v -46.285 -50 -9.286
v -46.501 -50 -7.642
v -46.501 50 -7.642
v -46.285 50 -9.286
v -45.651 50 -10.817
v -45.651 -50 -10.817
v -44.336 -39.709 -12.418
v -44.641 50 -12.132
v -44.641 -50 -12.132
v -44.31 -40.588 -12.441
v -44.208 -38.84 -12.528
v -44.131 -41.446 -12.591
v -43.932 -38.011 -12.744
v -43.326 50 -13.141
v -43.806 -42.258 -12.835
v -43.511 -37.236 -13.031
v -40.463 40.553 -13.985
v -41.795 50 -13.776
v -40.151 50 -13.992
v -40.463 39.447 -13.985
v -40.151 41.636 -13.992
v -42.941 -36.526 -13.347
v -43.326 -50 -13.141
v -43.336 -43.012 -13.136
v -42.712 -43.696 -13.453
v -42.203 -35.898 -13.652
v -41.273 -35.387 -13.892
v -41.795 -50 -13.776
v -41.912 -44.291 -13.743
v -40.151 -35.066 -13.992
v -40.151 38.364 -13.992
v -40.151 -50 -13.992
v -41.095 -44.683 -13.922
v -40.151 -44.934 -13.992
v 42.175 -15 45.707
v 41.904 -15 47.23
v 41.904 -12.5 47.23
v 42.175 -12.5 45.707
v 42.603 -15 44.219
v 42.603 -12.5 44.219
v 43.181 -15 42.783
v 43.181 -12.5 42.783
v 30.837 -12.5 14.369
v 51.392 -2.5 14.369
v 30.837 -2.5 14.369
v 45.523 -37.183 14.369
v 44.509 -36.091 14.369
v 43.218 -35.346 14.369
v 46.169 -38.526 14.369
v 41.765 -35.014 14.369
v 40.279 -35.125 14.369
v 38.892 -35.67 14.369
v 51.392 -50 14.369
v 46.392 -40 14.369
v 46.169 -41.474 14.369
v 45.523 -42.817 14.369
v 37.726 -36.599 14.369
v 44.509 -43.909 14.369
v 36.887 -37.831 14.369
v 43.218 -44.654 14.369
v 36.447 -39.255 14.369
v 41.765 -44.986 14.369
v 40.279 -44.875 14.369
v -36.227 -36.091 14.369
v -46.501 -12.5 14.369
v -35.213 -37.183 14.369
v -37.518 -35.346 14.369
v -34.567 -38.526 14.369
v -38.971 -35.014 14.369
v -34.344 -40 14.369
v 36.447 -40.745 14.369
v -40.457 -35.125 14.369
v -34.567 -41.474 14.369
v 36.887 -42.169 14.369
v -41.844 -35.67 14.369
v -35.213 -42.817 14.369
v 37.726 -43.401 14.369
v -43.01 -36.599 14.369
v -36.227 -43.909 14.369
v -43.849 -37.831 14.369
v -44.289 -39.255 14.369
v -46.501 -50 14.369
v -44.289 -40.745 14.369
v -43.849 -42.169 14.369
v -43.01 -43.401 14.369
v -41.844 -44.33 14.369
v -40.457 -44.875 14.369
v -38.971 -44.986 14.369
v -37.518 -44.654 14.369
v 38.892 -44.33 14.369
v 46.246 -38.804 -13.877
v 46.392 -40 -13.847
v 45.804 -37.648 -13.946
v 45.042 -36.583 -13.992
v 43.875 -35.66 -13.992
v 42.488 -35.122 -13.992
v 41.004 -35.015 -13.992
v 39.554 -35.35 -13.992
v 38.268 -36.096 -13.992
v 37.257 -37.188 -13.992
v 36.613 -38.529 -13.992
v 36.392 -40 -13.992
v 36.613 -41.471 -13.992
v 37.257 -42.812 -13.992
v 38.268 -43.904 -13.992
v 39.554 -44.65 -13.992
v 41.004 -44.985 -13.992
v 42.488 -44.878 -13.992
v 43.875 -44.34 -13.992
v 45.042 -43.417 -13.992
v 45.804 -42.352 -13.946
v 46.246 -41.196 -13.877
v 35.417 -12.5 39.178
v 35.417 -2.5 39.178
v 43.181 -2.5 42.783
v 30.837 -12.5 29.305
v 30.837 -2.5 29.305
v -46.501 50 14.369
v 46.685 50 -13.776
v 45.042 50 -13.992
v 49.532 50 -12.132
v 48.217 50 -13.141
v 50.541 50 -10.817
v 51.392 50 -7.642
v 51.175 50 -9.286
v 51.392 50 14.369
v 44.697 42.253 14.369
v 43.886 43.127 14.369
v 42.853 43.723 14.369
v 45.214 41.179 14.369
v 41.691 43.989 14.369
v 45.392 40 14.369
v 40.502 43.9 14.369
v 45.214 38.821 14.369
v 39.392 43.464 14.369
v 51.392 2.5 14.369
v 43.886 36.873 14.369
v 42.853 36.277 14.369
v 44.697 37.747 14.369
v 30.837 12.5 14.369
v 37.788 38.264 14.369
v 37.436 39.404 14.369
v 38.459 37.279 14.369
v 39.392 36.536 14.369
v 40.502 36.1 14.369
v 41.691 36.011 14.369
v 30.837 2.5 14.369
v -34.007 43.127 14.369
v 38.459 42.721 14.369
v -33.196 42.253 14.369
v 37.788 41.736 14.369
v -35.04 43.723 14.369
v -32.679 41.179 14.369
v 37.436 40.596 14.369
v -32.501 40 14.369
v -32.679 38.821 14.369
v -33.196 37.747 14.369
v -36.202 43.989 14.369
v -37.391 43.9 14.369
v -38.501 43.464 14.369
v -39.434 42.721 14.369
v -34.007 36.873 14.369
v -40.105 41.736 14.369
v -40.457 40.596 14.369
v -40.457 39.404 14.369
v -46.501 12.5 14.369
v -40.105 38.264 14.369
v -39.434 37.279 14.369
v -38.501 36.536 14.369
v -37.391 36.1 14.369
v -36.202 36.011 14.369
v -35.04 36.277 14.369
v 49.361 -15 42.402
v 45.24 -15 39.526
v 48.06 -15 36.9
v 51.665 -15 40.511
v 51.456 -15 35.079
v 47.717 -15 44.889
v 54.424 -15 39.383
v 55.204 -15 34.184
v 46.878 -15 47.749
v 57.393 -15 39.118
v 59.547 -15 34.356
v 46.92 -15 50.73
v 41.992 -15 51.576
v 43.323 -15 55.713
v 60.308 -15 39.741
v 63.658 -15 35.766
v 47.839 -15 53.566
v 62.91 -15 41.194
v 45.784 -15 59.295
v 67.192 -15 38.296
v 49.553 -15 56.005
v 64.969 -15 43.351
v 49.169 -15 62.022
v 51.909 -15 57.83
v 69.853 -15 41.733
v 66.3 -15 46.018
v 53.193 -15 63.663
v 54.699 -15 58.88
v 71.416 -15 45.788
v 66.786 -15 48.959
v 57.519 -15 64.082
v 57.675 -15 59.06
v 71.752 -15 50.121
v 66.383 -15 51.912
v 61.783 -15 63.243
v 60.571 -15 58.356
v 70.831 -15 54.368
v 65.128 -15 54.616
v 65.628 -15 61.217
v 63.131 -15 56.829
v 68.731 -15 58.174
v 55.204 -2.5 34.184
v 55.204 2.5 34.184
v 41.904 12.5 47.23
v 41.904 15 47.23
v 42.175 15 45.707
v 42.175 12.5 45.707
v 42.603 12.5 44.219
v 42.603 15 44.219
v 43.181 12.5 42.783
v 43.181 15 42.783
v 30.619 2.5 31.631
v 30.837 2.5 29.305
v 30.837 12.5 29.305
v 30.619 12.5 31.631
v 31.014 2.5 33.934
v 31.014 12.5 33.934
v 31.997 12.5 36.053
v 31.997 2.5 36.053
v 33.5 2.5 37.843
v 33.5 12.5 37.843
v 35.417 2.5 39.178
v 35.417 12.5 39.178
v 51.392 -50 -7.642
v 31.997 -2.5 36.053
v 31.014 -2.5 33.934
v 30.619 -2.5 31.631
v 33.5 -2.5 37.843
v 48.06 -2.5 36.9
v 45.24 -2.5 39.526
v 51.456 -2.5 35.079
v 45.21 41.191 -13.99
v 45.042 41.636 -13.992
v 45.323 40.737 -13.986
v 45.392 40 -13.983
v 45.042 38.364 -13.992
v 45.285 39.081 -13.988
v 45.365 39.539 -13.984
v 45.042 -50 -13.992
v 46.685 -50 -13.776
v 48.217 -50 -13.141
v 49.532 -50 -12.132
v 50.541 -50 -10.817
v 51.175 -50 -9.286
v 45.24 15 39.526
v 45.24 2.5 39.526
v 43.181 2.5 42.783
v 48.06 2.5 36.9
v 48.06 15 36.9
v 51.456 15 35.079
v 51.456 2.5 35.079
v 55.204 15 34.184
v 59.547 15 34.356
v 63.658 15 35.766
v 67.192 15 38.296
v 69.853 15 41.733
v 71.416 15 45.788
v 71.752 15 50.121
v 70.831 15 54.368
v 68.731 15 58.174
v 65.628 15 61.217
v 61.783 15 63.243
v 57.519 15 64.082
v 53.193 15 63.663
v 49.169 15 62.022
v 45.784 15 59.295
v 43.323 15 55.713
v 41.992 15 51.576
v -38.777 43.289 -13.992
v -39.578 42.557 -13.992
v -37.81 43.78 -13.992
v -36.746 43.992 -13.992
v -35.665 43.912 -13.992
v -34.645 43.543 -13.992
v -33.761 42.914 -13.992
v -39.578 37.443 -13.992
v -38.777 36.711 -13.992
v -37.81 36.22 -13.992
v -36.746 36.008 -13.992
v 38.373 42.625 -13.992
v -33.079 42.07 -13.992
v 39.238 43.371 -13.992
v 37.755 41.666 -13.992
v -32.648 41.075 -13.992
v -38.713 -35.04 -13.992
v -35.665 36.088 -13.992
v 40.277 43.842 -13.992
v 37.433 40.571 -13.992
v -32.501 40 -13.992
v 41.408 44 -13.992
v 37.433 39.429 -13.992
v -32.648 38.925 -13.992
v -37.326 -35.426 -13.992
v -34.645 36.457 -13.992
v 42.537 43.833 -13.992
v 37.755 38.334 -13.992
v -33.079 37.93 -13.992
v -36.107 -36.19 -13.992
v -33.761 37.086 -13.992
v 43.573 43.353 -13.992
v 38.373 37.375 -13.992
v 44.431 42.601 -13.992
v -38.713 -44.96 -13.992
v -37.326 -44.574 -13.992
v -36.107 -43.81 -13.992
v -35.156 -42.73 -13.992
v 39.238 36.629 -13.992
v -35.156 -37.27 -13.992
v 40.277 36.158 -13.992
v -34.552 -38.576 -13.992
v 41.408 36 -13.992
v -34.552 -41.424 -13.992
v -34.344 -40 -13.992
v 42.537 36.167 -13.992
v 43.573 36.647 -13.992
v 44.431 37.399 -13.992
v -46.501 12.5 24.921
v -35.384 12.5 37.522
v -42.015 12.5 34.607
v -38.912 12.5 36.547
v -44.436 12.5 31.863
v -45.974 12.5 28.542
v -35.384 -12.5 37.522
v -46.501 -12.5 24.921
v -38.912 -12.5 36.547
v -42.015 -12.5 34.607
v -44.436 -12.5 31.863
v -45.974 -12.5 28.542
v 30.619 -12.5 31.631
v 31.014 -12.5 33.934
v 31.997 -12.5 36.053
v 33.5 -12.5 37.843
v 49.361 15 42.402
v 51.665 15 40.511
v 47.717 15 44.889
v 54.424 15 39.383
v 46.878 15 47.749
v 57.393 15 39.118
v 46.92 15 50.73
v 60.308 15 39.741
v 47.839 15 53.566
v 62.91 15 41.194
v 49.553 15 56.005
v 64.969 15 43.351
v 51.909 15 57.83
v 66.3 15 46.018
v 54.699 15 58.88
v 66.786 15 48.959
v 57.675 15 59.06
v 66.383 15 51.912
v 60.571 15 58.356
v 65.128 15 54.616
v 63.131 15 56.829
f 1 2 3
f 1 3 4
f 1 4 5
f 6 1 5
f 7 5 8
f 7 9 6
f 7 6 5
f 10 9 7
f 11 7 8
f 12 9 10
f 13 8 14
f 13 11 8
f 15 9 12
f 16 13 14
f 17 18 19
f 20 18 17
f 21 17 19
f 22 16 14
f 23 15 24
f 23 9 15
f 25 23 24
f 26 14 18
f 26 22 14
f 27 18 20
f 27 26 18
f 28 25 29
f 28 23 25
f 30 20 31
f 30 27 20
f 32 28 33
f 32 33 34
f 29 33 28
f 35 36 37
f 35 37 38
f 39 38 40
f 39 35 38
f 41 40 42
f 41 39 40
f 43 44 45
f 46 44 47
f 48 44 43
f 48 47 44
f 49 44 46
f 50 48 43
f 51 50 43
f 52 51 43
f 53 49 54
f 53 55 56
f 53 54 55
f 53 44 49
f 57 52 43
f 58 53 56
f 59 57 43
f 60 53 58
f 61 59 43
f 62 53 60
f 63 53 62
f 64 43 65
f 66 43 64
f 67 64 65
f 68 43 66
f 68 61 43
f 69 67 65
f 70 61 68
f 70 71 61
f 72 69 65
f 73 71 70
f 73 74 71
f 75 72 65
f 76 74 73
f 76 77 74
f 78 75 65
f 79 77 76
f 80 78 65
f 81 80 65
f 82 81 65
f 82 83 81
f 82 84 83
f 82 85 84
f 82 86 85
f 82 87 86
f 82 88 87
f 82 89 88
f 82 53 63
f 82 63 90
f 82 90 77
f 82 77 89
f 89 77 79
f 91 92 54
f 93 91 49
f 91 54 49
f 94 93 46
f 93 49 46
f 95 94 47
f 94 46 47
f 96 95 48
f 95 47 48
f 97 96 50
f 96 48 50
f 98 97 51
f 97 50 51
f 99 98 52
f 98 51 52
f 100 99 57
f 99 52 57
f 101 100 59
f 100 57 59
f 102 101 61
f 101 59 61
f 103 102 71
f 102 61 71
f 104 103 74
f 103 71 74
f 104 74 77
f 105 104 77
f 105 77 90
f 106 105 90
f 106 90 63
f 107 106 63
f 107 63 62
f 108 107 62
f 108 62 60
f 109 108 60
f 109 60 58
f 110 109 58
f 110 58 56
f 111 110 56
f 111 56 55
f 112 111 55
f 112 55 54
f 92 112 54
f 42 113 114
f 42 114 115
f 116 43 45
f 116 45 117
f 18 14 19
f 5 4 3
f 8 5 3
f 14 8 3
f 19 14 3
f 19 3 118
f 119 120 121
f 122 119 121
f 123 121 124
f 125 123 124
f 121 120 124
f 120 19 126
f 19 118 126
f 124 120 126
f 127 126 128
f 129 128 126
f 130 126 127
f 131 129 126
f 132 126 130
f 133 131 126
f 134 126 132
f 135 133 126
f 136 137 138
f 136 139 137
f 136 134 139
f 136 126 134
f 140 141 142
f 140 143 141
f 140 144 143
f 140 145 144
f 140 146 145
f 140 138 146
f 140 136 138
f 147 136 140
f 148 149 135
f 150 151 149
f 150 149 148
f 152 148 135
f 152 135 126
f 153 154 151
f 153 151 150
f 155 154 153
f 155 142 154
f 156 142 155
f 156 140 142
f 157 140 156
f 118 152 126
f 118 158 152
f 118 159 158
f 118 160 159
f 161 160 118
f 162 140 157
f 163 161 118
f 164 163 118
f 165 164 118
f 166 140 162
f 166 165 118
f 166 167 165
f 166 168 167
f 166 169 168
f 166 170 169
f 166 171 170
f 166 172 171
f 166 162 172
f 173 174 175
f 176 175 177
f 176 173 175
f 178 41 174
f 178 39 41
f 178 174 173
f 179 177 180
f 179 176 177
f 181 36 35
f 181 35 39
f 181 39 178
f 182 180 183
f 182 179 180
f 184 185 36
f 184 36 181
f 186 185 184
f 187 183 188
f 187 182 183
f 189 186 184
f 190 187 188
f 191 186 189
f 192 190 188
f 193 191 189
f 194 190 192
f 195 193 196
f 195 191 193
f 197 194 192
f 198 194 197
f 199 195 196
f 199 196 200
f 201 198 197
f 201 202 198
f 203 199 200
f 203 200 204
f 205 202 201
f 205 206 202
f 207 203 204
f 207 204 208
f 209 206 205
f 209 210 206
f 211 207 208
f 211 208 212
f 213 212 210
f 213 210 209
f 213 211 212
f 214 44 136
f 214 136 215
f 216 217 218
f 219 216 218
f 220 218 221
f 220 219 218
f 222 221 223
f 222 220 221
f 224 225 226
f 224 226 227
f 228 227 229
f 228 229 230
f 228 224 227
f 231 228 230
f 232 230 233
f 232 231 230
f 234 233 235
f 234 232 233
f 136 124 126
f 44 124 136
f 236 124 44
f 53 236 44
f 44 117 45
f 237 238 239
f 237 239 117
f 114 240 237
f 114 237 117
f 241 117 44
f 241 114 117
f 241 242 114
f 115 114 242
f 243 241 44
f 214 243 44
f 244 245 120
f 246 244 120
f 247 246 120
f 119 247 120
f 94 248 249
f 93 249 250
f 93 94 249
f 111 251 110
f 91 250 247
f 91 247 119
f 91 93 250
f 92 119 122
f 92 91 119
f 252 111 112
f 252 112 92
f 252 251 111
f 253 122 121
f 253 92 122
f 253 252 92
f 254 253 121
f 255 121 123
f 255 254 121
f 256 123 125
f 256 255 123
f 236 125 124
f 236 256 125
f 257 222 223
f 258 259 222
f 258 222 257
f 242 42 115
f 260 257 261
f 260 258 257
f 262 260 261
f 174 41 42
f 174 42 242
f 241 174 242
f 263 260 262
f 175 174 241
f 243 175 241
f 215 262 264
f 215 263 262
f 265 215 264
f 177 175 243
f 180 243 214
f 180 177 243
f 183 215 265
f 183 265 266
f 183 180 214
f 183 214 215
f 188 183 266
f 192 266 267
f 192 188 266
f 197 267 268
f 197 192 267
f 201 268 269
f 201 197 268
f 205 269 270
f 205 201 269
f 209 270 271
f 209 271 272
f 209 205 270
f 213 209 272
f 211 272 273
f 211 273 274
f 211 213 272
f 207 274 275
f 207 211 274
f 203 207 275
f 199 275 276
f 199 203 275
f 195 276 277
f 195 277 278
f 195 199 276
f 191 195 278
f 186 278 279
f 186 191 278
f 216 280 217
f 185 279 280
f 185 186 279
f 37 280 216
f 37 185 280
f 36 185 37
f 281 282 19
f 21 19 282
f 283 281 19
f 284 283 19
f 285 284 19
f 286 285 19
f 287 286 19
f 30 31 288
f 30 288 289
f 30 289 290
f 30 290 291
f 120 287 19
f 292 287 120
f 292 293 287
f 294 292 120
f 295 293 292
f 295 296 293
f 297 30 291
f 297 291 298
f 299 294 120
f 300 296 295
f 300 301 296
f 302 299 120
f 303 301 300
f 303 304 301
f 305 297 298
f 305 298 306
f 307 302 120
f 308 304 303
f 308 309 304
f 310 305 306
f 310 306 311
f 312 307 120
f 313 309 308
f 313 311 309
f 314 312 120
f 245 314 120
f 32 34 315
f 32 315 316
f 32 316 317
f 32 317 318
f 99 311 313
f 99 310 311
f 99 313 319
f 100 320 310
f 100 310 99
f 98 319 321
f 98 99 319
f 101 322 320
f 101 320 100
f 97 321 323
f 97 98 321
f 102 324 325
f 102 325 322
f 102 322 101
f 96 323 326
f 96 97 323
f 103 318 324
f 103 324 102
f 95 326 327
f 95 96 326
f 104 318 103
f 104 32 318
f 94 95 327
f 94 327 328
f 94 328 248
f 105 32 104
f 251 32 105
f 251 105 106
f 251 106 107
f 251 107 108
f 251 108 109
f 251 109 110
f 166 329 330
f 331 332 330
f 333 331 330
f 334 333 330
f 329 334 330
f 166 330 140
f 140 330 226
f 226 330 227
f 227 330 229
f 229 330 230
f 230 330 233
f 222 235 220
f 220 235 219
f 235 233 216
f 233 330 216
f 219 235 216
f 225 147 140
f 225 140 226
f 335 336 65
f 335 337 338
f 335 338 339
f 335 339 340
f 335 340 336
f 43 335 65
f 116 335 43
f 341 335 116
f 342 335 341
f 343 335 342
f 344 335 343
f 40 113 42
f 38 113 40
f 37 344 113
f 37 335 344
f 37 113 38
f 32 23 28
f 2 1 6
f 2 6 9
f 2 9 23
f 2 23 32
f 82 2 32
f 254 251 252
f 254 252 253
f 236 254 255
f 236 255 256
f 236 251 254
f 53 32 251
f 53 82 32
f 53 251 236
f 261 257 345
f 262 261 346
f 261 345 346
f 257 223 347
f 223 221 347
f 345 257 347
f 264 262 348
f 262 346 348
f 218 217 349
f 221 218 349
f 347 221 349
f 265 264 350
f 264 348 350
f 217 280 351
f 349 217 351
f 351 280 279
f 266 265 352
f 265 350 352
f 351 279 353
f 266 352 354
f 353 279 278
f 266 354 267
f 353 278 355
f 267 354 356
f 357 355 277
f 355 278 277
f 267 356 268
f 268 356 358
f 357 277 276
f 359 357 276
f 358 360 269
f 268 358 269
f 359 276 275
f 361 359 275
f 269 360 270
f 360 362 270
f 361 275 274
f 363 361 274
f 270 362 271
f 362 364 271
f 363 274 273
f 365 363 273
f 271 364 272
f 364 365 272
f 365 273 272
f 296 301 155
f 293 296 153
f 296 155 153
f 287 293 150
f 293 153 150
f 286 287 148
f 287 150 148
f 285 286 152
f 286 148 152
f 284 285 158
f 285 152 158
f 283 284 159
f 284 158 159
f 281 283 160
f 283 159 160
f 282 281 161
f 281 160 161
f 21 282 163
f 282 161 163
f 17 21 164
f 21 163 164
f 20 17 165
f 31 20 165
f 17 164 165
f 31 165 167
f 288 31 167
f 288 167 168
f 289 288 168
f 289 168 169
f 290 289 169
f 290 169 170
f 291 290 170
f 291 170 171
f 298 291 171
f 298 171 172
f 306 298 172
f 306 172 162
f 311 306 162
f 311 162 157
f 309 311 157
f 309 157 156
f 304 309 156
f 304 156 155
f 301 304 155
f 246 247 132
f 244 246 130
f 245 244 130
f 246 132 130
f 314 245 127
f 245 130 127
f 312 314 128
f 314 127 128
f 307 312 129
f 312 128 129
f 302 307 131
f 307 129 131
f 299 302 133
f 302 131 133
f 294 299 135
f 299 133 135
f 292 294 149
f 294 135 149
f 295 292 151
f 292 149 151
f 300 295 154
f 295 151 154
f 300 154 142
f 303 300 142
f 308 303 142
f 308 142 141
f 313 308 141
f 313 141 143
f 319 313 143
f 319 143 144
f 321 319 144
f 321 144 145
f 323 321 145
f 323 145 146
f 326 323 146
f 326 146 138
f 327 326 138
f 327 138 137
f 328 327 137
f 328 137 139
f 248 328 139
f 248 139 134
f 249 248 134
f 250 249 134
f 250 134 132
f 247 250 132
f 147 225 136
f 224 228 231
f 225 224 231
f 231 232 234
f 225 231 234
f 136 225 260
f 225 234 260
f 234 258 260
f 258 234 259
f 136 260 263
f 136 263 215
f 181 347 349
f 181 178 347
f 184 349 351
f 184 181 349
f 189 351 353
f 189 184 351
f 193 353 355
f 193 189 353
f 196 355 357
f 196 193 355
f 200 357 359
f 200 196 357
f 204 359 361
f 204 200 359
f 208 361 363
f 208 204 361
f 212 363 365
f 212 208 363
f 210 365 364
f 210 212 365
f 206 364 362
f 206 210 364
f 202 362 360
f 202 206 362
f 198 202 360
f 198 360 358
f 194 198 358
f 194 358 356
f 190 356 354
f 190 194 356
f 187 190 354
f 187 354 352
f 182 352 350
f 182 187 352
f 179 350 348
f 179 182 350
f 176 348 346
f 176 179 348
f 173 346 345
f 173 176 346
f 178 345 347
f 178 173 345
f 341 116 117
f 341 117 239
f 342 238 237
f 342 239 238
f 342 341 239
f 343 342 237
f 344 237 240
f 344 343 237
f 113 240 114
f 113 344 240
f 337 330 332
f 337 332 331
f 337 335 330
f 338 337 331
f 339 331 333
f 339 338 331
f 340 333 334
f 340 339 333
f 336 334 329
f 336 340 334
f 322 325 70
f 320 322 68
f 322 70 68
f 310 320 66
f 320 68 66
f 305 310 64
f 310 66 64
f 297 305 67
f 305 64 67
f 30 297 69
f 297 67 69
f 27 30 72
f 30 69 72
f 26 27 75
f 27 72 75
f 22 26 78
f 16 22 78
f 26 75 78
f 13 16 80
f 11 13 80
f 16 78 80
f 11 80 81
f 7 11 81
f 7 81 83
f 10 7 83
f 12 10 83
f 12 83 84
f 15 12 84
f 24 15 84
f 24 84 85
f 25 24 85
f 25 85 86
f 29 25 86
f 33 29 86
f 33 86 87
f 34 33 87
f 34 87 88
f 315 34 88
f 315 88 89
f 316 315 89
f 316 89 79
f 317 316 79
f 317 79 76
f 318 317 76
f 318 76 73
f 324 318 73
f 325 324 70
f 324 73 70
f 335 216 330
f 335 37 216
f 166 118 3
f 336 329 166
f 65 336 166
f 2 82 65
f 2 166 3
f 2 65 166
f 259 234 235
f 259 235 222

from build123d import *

# Parameters (mm, degrees)
F1_DEPTH = 50
F2_DEPTH = 12.5
F3_DEPTH = 2.5
F4_DEPTH = 15
F5_DEPTH = 15
F6_R     = 4
F6_R_2   = 5
F7_DEPTH = 28.3608646168


with BuildPart() as f1:
    # F0 (on Front) → F1 (new body, symmetric)
    with BuildSketch(Plane.XZ):
        with BuildLine():
            Line((30.8374185115, 14.368654698), (-46.5013422072, 14.368654698))
            Line((-46.5013422072, 14.368654698), (-46.5013422072, -7.6422099188))
            ThreePointArc((-46.5013422072, -7.6422099188), (-44.6414702677, -12.1323379793), (-40.1513422072, -13.9922099188))
            Line((-40.1513422072, -13.9922099188), (45.0415951966, -13.9922099188))
            ThreePointArc((45.0415951966, -13.9922099188), (49.5317232571, -12.1323379793), (51.3915951966, -7.6422099188))
            Line((51.3915951966, -7.6422099188), (51.3915951966, 14.368654698))
            Line((51.3915951966, 14.368654698), (30.8374185115, 14.368654698))
        make_face()
    extrude(amount=F1_DEPTH, both=True)

    # F0 (on Front) → F2 (join, symmetric)
    with BuildSketch(Plane.XZ):
        with BuildLine():
            Line((-46.5013422072, 24.9208568856), (-46.5013422072, 14.368654698))
            Line((-46.5013422072, 14.368654698), (30.8374185115, 14.368654698))
            Line((30.8374185115, 14.368654698), (30.8374185115, 29.3047134256))
            ThreePointArc((30.8374185115, 29.3047134256), (31.435925298, 35.0257883198), (35.4166887701, 39.1781888902))
            Line((35.4166887701, 39.1781888902), (43.1814734347, 42.7832674845))
            ThreePointArc((43.1814734347, 42.7832674845), (42.3700127292, 44.9572589365), (41.9035704488, 47.2303930965))
            Line((41.9035704488, 47.2303930965), (-35.384222781, 37.5218286374))
            ThreePointArc((-35.384222781, 37.5218286374), (-43.324802274, 33.3228630958), (-46.5013422072, 24.9208568856))
        make_face()
    extrude(amount=F2_DEPTH, both=True)

    # F0 (on Front) → F3 (join, symmetric)
    with BuildSketch(Plane.XZ):
        with BuildLine():
            Line((30.8374185115, 29.3047134256), (30.8374185115, 14.368654698))
            Line((30.8374185115, 14.368654698), (51.3915951966, 14.368654698))
            Line((51.3915951966, 14.368654698), (55.2041724073, 34.1836406995))
            ThreePointArc((55.2041724073, 34.1836406995), (48.0599839593, 36.8996898007), (43.1814734347, 42.7832674845))
            Line((43.1814734347, 42.7832674845), (35.4166887701, 39.1781888902))
            ThreePointArc((35.4166887701, 39.1781888902), (31.435925298, 35.0257883198), (30.8374185115, 29.3047134256))
        make_face()
    extrude(amount=F3_DEPTH, both=True)

    # F0 (on Front) → F4 (join, symmetric)
    with BuildSketch(Plane.XZ):
        with BuildLine():
            Line((46.8645829495, 47.8535744248), (41.9035704488, 47.2303930965))
            ThreePointArc((41.9035704488, 47.2303930965), (42.3700127292, 44.9572589365), (43.1814734347, 42.7832674845))
            Line((43.1814734347, 42.7832674845), (47.7165182734, 44.8888240168))
            ThreePointArc((47.7165182734, 44.8888240168), (47.1755444697, 46.3381516515), (46.8645829495, 47.8535744248))
        make_face()
    extrude(amount=F4_DEPTH, both=True)

    # F0 (on Front) → F5 (join, symmetric)
    with BuildSketch(Plane.XZ):
        with BuildLine():
            ThreePointArc((43.1814734347, 42.7832674845), (48.0599839593, 36.8996898007), (55.2041724073, 34.1836406995))
            ThreePointArc((55.2041724073, 34.1836406995), (66.8181448931, 37.9478849573), (71.7866079509, 49.0999370813))
            ThreePointArc((71.7866079509, 49.0999370813), (55.8500083917, 64.0706679007), (41.9035704488, 47.2303930965))
            Line((41.9035704488, 47.2303930965), (46.8645829495, 47.8535744248))
            ThreePointArc((46.8645829495, 47.8535744248), (56.1622082448, 59.0804242942), (66.7866079509, 49.0999370813))
            ThreePointArc((66.7866079509, 49.0999370813), (58.9428898464, 39.3351816626), (47.7165182734, 44.8888240168))
            Line((47.7165182734, 44.8888240168), (43.1814734347, 42.7832674845))
        make_face()
    extrude(amount=F5_DEPTH, both=True)

    # F6 (on face) → F7 (cut, through all)
    with BuildSketch(Plane.XY.offset(14.368654698)):
        with Locations((-36.5013422072, 40)):
            Circle(F6_R)
        with Locations((41.3915951966, 40)):
            Circle(F6_R)
        with Locations((-39.3444672227, -40)):
            Circle(F6_R_2)
        with Locations((41.3915951966, -40)):
            Circle(F6_R_2)
    extrude(amount=-F7_DEPTH, mode=Mode.SUBTRACT)


solid = f1.part
